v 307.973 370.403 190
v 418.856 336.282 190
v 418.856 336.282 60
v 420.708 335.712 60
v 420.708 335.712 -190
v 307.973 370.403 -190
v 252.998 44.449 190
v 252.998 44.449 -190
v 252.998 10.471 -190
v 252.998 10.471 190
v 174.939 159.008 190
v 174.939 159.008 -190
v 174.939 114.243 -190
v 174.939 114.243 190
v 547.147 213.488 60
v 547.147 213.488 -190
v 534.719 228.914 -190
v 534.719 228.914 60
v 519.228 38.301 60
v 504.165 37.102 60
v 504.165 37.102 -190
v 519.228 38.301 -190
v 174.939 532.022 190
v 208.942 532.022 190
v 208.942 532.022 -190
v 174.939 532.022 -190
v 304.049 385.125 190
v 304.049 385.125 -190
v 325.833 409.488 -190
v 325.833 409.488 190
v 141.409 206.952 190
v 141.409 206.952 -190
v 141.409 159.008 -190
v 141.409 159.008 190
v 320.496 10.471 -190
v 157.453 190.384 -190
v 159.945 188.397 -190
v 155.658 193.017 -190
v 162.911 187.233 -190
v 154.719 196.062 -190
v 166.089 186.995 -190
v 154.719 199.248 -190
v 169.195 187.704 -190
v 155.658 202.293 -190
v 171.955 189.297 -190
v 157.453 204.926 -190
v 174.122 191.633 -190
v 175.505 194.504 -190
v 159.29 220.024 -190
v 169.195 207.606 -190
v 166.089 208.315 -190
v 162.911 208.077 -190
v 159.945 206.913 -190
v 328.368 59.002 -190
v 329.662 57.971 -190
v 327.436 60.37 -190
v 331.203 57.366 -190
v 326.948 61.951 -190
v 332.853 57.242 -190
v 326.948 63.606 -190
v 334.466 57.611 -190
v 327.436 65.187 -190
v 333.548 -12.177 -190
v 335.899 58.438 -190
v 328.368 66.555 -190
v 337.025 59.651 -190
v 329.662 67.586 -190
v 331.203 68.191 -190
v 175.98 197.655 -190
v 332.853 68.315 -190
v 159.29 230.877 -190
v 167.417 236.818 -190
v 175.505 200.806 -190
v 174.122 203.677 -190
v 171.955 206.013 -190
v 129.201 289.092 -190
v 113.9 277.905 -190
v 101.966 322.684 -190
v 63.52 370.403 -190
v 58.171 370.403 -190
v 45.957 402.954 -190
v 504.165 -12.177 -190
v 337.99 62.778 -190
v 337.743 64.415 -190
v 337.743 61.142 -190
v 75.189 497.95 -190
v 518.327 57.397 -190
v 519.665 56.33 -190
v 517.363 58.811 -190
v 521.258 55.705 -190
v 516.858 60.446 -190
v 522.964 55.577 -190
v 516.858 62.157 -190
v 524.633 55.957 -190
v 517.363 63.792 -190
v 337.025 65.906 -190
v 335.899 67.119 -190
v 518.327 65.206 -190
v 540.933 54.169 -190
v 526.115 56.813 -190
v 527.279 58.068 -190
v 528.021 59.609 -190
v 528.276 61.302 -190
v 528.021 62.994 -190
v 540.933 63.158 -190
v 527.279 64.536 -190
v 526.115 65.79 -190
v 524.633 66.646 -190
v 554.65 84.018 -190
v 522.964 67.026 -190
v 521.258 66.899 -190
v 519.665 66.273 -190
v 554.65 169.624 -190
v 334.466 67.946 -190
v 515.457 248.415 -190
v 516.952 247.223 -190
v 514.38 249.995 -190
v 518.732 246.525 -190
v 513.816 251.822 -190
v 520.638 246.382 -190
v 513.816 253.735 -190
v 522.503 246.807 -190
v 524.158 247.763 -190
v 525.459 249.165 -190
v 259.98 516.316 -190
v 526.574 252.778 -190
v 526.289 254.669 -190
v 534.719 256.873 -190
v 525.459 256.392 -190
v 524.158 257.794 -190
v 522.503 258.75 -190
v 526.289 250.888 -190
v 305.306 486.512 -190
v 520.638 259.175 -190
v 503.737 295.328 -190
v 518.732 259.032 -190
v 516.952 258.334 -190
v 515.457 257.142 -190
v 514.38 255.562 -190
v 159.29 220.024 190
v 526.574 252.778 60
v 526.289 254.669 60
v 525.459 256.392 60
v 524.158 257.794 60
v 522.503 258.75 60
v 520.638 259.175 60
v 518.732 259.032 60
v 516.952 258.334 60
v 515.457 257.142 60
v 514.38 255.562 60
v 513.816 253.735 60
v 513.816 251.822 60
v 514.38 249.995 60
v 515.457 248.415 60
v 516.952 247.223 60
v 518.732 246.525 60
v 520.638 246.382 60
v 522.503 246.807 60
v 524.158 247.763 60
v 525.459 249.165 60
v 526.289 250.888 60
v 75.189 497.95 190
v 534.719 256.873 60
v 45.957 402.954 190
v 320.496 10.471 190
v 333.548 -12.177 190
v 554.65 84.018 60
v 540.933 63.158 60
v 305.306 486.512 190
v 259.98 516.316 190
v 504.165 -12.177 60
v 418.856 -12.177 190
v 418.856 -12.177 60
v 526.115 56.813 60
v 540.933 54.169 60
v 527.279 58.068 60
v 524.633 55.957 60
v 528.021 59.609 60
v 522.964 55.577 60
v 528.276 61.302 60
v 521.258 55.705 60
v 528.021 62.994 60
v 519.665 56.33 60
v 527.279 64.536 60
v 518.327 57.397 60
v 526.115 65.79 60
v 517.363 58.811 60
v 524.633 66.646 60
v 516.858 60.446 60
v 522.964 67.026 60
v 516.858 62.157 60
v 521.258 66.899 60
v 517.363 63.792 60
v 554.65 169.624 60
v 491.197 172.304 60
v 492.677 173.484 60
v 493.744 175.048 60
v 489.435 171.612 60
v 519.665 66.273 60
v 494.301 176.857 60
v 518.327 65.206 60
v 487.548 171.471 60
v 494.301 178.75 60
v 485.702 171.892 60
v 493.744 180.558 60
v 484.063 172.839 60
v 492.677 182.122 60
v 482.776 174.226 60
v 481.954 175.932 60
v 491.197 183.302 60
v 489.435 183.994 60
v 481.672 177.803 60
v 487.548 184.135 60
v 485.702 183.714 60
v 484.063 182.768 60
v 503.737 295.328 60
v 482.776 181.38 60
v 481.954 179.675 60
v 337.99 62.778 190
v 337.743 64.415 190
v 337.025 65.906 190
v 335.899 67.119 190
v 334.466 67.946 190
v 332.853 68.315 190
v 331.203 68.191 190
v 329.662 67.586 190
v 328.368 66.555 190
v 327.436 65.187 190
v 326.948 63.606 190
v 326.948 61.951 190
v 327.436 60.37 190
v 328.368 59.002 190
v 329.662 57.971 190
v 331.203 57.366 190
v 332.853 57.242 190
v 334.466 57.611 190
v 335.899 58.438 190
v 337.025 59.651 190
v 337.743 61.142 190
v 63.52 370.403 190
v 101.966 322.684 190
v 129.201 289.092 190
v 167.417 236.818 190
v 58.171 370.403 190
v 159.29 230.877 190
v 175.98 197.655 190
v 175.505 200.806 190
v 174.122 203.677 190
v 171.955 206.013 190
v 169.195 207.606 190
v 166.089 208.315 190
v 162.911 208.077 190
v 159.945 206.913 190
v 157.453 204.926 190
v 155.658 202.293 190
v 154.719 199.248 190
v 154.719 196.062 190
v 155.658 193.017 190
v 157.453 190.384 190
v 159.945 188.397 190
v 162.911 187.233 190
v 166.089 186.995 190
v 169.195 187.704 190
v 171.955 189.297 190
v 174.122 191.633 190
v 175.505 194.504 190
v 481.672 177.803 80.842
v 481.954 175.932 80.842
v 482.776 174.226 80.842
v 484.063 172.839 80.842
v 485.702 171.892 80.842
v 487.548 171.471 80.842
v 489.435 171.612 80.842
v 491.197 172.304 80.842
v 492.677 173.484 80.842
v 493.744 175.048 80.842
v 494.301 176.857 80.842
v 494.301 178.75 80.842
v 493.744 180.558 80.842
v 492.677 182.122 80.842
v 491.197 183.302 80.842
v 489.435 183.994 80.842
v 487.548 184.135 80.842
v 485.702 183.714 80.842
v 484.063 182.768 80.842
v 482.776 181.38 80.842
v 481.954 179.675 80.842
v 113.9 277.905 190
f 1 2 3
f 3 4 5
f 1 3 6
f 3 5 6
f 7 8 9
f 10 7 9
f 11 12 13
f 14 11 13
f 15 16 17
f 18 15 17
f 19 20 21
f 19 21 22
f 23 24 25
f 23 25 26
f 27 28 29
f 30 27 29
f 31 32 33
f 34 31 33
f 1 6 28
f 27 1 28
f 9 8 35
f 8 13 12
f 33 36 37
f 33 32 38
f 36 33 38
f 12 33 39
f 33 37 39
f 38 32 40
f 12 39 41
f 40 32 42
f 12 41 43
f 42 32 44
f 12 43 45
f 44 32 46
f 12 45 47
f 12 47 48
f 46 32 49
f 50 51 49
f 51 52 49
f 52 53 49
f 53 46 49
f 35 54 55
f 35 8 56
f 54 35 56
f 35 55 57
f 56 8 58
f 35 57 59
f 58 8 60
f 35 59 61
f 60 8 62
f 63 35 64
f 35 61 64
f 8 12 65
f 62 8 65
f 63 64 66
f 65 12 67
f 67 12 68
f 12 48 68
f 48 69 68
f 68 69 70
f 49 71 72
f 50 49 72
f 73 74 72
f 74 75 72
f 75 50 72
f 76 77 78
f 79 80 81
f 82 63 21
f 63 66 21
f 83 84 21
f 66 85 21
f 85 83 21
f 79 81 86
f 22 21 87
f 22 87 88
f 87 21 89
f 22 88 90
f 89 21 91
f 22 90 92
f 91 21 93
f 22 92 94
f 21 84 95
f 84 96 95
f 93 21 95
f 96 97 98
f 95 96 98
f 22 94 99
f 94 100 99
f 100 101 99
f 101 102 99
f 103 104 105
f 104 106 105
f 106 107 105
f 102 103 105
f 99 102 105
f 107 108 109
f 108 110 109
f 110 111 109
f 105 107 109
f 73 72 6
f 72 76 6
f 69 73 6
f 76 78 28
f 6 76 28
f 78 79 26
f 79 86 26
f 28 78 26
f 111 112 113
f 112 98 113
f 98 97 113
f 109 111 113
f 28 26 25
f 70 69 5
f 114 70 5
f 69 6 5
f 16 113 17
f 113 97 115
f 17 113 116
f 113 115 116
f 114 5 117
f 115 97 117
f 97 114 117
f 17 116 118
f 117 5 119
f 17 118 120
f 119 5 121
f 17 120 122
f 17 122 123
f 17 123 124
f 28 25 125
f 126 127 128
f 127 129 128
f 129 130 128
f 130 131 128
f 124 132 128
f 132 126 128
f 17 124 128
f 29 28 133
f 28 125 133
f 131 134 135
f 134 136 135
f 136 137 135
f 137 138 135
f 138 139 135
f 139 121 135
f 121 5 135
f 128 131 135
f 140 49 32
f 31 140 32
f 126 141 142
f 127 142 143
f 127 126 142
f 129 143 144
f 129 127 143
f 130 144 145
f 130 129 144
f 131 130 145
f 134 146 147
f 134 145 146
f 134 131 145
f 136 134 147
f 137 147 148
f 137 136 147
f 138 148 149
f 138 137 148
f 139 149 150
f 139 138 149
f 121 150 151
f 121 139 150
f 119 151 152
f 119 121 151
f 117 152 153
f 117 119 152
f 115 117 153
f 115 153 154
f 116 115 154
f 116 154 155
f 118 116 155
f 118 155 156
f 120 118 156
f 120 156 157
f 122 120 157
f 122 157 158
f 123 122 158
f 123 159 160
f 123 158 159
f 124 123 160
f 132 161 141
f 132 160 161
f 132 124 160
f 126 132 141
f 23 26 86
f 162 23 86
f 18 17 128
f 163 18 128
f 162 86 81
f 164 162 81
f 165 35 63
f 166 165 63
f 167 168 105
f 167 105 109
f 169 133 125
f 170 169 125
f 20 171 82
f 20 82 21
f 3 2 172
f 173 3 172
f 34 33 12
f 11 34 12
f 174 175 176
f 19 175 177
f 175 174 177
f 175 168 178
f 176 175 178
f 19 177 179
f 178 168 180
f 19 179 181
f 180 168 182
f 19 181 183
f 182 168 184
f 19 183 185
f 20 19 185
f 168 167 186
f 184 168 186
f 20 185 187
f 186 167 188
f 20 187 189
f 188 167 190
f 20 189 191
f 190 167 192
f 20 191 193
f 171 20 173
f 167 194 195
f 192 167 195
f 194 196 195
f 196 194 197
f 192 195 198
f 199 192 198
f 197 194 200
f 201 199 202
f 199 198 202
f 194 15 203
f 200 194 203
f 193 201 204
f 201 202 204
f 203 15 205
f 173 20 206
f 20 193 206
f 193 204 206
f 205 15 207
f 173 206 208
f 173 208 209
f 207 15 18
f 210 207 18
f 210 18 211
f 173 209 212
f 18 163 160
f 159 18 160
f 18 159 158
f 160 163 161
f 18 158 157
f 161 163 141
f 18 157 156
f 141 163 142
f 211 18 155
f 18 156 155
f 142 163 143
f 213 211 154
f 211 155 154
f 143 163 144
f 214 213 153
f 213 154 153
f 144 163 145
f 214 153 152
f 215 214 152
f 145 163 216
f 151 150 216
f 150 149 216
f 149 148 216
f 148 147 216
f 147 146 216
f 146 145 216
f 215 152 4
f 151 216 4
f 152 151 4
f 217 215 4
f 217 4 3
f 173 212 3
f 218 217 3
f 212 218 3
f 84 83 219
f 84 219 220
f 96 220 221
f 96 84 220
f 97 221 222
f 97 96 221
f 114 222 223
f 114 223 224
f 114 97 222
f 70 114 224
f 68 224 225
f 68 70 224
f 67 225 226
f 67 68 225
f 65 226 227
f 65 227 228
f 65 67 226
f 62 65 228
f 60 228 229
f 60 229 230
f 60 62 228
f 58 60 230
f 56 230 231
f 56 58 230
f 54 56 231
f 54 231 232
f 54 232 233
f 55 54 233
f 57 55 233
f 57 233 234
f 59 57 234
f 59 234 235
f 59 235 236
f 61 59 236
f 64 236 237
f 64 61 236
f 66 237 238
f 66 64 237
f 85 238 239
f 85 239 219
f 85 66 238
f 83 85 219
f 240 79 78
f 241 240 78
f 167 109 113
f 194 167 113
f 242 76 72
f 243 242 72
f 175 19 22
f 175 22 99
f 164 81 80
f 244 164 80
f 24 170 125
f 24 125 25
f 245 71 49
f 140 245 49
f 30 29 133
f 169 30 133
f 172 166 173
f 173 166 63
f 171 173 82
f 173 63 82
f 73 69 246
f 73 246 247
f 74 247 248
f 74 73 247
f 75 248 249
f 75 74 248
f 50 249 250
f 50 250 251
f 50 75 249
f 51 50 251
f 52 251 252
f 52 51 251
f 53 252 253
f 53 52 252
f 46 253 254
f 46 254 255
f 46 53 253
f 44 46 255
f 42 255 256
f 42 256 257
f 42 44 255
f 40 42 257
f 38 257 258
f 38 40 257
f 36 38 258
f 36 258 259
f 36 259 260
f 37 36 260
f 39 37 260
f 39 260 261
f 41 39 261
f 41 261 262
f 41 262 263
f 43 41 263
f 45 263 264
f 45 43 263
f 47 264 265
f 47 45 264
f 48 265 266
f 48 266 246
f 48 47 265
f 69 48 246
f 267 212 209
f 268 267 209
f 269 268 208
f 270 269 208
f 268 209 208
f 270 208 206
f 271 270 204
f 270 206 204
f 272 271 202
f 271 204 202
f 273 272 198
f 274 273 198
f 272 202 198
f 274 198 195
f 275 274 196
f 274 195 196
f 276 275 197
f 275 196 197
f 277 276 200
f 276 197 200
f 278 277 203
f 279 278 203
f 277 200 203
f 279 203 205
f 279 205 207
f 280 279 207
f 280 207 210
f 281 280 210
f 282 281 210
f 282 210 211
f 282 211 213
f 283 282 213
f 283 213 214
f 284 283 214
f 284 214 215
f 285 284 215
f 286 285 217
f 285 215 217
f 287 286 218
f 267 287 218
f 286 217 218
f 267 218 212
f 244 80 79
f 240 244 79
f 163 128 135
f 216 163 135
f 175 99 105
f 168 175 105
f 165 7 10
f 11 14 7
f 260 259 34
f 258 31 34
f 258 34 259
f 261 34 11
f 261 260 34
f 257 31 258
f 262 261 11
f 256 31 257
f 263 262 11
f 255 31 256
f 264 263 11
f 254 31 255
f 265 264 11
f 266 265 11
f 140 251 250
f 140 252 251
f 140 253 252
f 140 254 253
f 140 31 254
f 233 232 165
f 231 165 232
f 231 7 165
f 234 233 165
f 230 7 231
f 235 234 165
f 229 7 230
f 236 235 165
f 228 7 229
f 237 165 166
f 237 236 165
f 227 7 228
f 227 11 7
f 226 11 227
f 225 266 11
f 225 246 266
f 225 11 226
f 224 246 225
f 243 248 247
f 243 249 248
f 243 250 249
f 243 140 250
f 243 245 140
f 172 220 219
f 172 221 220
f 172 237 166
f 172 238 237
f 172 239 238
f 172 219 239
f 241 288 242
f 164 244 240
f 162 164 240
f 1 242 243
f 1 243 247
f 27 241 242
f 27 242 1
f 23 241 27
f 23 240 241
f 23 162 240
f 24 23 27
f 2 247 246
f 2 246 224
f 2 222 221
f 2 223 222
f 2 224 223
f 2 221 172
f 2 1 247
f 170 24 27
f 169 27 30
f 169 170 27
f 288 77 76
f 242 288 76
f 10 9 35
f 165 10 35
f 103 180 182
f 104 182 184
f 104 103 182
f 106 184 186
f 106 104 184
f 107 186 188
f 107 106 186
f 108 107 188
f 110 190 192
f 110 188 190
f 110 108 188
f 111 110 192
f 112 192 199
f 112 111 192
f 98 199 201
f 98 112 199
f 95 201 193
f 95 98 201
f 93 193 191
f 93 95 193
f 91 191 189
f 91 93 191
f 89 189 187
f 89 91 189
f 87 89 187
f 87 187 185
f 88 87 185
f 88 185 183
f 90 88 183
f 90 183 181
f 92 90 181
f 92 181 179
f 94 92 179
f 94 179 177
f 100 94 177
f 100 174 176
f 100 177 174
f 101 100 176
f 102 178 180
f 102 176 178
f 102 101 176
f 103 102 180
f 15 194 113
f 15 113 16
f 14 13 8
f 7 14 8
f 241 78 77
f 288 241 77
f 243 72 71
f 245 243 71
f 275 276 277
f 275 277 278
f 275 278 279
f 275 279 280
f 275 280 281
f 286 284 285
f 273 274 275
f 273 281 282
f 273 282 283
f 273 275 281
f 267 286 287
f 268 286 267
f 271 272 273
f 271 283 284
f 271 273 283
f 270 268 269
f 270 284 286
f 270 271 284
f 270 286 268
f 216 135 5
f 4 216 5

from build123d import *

# Parameters (mm, degrees)
BOSS_EXTRUDE1_DEPTH      = 190
BOSS_EXTRUDE1_DEPTH_BACK = 190
SKETCH1_R                = 10.68990167
SKETCH1_R_2              = 5.55170817
SKETCH1_R_3              = 5.740939067
CUT_EXTRUDE1_DEPTH       = 130
SKETCH3_R                = 6.35
BOSS_EXTRUDE2_DEPTH      = 20.842314


with BuildPart() as part:
    # Sketch1 → Boss-Extrude1 (new, two sides: drawn at the far end of the back side and taken through both)
    with BuildSketch(Plane(origin=(35.496606972, -5.136974217, 0), x_dir=(1, 0, 0), z_dir=(0, 0, 1)).offset(-BOSS_EXTRUDE1_DEPTH_BACK)):
        Polygon((284.999883711, 15.607484417), (298.05126311, -7.040344443), (468.668102698, -7.040344443), (468.668102698, 42.23937617), (483.730976142, 43.43752253), (505.436181993, 59.305899042), (505.436181993, 68.294900601), (519.153293081, 89.155402568), (519.153293081, 174.760868396), (511.650398428, 218.625107166), (499.221965558, 234.051088018), (499.221965558, 262.010224281), (468.239986725, 300.464582706), (385.211765775, 340.848977513), (272.476434341, 375.539814705), (268.552869962, 390.26169862), (290.33684476, 414.625354644), (269.809144882, 491.648791872), (224.483340249, 521.453400518), (173.444905467, 537.158911905), (139.442820163, 537.158911905), (39.692575389, 503.086502617), (10.46069044, 408.091209769), (22.67467758, 375.539814705), (28.02290557, 375.539814705), (66.468894181, 327.821241466), (78.40300996, 283.042400046), (93.703979809, 294.228727981), (131.920372994, 241.955284607), (123.793017705, 236.013487296), (123.793017705, 225.161132619), (105.912703634, 212.089081713), (105.912703634, 164.144657424), (139.442820163, 164.144657424), (139.442820163, 119.380028144), (217.501813233, 49.586104929), (217.501813233, 15.607484417), align=None)
        with Locations((129.793078962, 202.791946132)):
            Circle(SKETCH1_R, mode=Mode.SUBTRACT)
        with Locations((296.941277772, 67.915461322)):
            Circle(SKETCH1_R_2, mode=Mode.SUBTRACT)
        with Locations((487.038630051, 66.43854159)):
            Circle(SKETCH1_R_3, mode=Mode.SUBTRACT)
        with BuildLine():
            ThreePointArc((491.077076188, 257.915461322), (478.307933648, 257.038889769), (490.837506869, 259.652158561))
            ThreePointArc((490.837506869, 259.652158561), (491.016901616, 258.792032876), (491.077076188, 257.915461322))
        make_face(mode=Mode.SUBTRACT)
    extrude(amount=BOSS_EXTRUDE1_DEPTH + BOSS_EXTRUDE1_DEPTH_BACK)

    # Sketch2 → Cut-Extrude1 (cut)
    with BuildSketch(Plane.XY.offset(190)):
        Polygon((418.856289876, -12.17731866), (418.856289876, 350.274106715), (582.658710341, 350.274106715), (582.658710341, -17.845830548), (418.856289876, -17.845830548), align=None)
    extrude(amount=-CUT_EXTRUDE1_DEPTH, mode=Mode.SUBTRACT)

    # Sketch3 → Boss-Extrude2 (add)
    with BuildSketch(Plane.XY.offset(60)):
        with Locations((488.022362989, 177.803201914)):
            Circle(SKETCH3_R)
    extrude(amount=BOSS_EXTRUDE2_DEPTH)


solid = part.part
